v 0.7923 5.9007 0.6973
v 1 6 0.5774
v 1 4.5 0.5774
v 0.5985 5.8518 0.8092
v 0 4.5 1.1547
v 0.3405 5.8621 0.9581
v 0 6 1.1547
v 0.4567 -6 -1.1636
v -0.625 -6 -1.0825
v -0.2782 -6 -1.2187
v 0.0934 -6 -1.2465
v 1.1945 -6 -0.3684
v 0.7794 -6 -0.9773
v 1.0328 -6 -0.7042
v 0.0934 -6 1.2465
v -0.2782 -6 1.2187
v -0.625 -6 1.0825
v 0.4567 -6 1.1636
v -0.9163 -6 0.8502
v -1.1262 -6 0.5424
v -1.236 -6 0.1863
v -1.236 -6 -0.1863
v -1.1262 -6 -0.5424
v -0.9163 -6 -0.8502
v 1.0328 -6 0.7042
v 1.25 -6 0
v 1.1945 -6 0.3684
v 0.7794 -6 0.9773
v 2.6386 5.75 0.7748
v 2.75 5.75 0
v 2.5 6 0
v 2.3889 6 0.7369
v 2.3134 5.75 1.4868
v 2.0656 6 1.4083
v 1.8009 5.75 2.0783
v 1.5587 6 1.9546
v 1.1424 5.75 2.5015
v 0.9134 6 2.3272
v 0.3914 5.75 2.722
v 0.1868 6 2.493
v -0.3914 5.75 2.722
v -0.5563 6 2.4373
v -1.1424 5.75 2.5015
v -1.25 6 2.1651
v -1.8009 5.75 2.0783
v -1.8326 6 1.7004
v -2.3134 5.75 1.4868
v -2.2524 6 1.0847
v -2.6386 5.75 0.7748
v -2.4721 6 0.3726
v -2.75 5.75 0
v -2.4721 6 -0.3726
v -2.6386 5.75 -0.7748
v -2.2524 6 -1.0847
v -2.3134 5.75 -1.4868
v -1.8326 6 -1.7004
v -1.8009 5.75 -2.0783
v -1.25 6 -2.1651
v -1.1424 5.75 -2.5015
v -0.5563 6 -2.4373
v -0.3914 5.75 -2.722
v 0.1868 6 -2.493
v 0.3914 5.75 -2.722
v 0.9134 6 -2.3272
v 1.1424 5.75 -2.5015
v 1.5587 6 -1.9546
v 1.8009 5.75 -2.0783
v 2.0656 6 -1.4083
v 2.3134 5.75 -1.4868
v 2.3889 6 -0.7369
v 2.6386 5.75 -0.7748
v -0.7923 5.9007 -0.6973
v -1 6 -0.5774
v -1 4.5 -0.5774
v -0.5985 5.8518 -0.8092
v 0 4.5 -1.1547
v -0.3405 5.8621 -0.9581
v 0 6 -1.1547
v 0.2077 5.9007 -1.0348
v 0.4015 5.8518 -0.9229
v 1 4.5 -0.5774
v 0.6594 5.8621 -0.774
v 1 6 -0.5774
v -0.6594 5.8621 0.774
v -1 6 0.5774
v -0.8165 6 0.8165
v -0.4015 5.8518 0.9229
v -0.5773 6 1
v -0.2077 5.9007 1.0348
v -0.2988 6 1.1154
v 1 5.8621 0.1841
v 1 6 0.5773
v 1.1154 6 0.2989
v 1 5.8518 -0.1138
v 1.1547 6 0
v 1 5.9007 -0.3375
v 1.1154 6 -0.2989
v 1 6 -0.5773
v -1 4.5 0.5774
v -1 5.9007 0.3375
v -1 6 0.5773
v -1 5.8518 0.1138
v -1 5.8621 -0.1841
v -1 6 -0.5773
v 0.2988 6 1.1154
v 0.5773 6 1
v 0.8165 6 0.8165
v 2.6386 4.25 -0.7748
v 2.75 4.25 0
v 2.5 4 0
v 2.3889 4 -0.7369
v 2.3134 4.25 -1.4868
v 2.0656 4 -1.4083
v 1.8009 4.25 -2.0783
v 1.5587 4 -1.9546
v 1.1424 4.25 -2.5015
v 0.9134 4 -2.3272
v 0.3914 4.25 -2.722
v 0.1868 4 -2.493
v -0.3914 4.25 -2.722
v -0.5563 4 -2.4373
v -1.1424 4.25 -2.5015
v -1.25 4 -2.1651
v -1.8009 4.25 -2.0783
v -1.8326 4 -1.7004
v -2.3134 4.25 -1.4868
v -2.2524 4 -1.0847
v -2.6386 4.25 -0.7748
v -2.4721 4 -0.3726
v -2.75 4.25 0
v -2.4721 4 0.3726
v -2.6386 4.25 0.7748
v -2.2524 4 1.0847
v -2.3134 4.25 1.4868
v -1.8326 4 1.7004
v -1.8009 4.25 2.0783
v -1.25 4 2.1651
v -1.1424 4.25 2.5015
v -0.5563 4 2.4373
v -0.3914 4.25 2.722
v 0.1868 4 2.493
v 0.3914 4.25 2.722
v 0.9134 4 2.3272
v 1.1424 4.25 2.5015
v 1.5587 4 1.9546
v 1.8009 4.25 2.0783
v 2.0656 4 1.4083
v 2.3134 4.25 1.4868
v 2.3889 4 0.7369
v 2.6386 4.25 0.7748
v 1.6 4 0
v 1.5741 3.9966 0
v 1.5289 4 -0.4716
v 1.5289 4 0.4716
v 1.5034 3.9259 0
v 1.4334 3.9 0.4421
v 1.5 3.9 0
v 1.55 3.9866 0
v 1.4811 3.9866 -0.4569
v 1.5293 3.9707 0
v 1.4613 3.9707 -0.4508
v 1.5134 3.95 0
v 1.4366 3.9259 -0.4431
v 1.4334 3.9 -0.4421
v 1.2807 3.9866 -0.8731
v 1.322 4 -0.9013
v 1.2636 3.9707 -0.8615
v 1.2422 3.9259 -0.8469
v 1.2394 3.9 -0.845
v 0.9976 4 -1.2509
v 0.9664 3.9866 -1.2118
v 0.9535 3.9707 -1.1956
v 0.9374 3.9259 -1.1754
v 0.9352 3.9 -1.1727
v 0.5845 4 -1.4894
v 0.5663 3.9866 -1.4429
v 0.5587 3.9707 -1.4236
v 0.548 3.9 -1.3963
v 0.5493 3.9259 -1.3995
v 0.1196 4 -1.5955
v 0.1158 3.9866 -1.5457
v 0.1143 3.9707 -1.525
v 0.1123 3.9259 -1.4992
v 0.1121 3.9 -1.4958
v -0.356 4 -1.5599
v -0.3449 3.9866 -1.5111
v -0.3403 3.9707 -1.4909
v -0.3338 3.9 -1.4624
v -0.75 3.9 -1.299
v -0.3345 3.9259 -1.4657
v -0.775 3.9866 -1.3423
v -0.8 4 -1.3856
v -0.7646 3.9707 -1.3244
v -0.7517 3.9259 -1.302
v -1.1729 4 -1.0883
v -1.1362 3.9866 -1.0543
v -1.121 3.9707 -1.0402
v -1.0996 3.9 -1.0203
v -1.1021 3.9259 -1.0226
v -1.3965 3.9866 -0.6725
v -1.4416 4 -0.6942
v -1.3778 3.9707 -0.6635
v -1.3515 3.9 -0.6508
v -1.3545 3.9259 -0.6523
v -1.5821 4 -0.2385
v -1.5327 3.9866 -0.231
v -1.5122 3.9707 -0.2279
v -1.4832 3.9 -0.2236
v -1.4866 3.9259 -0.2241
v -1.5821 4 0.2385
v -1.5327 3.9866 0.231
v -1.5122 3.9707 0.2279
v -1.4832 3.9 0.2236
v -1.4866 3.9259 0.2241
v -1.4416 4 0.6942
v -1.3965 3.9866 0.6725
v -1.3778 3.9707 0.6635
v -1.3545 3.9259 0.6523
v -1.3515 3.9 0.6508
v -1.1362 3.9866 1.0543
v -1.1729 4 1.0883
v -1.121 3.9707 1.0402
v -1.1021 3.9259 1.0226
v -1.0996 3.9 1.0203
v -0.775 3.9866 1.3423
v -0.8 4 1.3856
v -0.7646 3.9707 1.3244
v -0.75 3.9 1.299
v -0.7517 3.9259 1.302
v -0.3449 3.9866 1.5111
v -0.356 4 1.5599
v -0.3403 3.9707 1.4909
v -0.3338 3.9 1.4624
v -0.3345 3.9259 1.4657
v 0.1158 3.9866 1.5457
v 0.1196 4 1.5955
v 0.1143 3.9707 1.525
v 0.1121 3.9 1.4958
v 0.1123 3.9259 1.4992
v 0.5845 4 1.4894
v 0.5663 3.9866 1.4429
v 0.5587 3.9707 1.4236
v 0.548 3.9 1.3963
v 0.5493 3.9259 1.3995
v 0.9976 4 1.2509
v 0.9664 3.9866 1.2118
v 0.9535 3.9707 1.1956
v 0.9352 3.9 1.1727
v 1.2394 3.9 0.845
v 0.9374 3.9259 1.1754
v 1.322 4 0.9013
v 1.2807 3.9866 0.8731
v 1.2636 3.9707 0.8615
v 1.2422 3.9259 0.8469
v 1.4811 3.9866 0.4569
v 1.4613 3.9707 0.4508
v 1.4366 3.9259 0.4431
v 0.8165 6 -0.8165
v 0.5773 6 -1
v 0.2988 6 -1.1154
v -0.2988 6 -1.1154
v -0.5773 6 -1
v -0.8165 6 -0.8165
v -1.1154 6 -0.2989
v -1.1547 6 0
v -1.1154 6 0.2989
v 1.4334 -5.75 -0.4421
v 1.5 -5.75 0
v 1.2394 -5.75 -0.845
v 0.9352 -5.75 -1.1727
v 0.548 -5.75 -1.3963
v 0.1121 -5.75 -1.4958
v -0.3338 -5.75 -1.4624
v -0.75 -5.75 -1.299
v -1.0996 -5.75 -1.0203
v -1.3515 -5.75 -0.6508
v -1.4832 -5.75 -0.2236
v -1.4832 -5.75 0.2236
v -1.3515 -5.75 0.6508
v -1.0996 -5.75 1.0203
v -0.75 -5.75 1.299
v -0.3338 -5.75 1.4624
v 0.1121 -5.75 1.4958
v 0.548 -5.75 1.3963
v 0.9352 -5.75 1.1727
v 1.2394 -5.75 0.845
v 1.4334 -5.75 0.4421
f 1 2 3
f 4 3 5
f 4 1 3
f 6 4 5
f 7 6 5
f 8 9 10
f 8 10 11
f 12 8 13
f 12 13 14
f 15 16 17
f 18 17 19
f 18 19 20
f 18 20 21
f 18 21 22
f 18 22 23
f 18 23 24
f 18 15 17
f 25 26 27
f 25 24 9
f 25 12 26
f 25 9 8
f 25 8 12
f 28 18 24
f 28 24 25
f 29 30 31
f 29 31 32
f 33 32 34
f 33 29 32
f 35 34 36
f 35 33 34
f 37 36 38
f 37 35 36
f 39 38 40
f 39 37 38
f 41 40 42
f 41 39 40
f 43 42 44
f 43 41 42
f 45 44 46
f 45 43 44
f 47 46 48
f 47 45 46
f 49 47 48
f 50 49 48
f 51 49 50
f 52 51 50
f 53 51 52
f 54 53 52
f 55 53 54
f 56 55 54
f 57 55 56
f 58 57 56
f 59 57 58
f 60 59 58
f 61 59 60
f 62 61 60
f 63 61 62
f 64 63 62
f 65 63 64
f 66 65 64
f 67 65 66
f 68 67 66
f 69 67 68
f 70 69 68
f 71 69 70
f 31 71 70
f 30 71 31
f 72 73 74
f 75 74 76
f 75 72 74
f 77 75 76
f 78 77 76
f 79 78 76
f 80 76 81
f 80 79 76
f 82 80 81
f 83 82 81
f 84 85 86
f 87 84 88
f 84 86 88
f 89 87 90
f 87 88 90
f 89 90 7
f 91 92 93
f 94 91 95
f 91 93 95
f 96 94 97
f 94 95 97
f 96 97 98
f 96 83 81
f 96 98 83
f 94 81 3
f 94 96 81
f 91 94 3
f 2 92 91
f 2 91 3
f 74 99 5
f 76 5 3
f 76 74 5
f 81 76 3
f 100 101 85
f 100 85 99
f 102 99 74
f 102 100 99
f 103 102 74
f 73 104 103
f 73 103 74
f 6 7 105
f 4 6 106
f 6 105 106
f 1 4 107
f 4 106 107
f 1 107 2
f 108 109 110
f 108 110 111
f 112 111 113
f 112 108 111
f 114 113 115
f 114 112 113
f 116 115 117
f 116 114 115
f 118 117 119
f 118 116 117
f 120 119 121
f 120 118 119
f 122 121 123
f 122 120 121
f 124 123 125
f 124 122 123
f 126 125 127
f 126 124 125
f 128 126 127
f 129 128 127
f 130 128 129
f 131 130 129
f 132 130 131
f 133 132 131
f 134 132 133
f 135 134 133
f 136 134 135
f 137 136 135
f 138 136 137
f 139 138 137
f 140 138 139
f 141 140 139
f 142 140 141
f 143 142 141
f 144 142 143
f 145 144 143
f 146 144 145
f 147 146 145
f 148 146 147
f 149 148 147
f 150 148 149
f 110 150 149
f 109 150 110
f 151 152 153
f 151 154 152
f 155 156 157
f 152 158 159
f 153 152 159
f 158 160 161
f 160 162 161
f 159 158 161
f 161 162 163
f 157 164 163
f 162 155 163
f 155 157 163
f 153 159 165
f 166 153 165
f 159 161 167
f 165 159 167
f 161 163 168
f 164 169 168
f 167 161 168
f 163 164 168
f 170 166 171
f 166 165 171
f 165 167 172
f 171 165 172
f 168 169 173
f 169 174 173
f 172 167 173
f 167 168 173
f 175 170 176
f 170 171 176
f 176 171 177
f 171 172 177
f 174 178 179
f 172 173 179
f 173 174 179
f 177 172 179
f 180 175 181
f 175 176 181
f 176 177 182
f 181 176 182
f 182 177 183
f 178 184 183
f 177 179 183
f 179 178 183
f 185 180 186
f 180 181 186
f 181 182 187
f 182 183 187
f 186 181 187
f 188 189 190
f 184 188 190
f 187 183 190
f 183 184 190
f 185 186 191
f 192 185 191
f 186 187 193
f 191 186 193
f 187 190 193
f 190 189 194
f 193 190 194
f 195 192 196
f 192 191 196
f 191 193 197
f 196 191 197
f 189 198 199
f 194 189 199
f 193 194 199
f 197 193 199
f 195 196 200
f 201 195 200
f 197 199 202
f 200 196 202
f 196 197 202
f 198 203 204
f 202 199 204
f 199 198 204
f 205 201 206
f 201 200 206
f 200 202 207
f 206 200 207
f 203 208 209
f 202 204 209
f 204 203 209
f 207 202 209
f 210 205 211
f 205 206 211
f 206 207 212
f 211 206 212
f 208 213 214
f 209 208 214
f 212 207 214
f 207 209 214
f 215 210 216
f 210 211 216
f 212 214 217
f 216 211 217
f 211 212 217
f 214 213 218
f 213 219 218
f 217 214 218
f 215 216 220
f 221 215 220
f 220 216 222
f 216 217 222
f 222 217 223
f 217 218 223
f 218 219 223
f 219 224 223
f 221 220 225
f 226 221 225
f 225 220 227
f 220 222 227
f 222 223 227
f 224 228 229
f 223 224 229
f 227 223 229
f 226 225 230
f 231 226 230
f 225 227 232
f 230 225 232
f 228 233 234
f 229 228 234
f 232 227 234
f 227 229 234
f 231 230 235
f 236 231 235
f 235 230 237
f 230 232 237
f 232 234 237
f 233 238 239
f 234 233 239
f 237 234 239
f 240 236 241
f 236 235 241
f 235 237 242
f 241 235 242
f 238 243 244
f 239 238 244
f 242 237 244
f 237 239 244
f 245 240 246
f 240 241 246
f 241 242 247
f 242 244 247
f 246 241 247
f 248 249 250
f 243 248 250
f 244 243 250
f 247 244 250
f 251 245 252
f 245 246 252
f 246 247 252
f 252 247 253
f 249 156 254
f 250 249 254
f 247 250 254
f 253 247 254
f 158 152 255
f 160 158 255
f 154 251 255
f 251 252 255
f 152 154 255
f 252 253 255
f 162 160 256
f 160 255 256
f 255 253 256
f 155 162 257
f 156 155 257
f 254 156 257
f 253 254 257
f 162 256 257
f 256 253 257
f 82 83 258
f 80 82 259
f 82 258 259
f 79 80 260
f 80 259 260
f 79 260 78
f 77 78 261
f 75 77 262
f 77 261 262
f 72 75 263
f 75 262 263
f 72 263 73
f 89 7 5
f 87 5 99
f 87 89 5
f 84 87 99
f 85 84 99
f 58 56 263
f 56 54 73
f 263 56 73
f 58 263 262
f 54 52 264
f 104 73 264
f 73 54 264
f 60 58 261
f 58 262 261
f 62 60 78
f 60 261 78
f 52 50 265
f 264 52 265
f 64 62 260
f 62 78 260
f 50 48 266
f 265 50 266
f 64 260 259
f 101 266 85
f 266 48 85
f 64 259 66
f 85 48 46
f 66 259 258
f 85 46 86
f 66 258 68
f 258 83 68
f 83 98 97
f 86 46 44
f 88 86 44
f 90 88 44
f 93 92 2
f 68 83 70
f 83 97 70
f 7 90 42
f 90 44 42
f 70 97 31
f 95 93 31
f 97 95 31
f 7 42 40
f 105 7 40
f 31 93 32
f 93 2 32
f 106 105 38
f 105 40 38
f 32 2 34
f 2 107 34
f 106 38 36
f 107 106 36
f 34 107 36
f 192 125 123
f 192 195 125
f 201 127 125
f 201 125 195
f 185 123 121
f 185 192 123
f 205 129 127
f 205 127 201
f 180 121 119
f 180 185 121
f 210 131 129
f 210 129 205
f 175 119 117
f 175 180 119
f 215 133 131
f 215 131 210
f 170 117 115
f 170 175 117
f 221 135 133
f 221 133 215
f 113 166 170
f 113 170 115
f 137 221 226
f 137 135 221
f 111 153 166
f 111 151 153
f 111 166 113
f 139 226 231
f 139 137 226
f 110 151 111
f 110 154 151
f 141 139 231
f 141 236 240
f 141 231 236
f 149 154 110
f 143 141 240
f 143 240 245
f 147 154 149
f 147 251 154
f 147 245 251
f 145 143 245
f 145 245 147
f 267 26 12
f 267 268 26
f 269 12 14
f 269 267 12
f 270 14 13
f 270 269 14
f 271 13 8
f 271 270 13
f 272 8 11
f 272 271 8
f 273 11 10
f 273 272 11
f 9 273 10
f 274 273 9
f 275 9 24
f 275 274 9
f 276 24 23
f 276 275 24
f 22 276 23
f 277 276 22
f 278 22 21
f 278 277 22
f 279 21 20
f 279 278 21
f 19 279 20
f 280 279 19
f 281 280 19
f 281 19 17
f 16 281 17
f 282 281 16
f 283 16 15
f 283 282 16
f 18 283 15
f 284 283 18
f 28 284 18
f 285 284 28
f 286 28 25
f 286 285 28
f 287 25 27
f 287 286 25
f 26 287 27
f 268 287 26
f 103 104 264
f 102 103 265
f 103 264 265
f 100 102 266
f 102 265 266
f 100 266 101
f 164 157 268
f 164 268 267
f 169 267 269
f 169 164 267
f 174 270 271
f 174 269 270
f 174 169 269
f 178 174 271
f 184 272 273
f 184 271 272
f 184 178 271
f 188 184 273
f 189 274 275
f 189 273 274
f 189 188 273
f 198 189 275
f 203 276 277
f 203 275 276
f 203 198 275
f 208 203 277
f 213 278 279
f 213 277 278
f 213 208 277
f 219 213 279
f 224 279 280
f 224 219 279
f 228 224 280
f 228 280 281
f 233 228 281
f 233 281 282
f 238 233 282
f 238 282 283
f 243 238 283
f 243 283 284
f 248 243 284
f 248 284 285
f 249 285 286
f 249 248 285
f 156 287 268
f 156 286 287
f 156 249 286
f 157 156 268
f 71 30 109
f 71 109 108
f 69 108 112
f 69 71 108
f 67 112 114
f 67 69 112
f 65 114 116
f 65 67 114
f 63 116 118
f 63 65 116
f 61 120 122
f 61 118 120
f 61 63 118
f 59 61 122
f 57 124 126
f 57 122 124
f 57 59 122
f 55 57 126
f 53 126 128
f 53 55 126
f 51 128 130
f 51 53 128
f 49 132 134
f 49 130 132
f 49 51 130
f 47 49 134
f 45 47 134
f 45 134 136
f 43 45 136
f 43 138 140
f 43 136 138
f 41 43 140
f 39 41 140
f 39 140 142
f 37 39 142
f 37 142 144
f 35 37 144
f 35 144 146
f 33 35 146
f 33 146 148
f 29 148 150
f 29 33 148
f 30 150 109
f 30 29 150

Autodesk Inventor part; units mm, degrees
ref_plane "YZ Plane" through (0, 0, 0) normal (1, 0, 0) x (0, 1, 0)
ref_plane "XZ Plane" through (0, 0, 0) normal (0, 1, 0) x (-1, 0, 0)
ref_plane "XY Plane" through (0, 0, 0) normal (0, 0, 1) x (1, 0, 0)
sketch "Sketch1" plane through (0, 0, 0) normal (0, 0, 1) x (1, 0, 0)
  line L0 (0, 6) -> (0, -6)
  line L1 (0, -6) -> (1.25, -6)
  line L2 (1.25, -6) -> (1.5, -5.75)
  line L3 (1.5, -5.75) -> (1.5, 3.9)
  line L4 (1.6, 4) -> (2.5, 4)
  line L5 (2.75, 4.25) -> (2.75, 5.75)
  line L6 (2.5, 6) -> (0, 6)
  arc A0 (1.6, 4) -> (1.5, 3.9) centre (1.6, 3.9) ccw
  line L7 (2.5, 6) -> (2.75, 5.75)
  line L8 (2.5, 4) -> (2.75, 4.25)
  point P0 (0, 0)
  point P1 (2.75, 4)
  point P2 (2.75, 6)
  point P3 (0, 0)
  dimension "d0" = 5.5
  dimension "d1" = 2
  dimension "d3" = 3
  dimension "d4" = 3.2
  dimension "d5" = 135
  dimension "d6" = 0.25
  dimension "d7" = 10
  dimension "d9" = 0.25
revolve "Revolution1" add sketch "Sketch1" angle 360 about axis through (0, 6, 0) along (0, -1, 0)
sketch "Sketch2" plane through (0, 6, 0) normal (0, 1, 0) x (1, 0, 0)
  line L0 (0, -1.1547) -> (-1, -0.5774)
  line L1 (-1, -0.5774) -> (-1, 0.5774)
  line L2 (-1, 0.5774) -> (0, 1.1547)
  line L3 (0, 1.1547) -> (1, 0.5774)
  line L4 (1, 0.5774) -> (1, -0.5774)
  line L5 (1, -0.5774) -> (0, -1.1547)
  point P0 (0, 0)
  point P1 (0, 0)
  dimension "d11" = 2
extrude "Extrusion1" cut sketch "Sketch2" against normal blind 1.5
thread "Thread1" size "M3x0.35" class "6g" standard "ANSI Metric M Profile" full length
sketch "Sketch3" plane through (0, 0, 0) normal (1, 0, 0) x (0, 1, 0)
  line L0 (6, 1.1547) -> (5, 0.1547)
  line L1 (5, 0.1547) -> (6, 0.1547)
  line L2 (6, 0.1547) -> (6, 1.1547)
  line L3 (-1.4, 0) -> (8.4, 0) projected
  point P0 (0, 0)
  dimension "d18" = 1
revolve "Revolution2" cut sketch "Sketch3" angle 360 about axis through (0, -10, 0) along (0, 1, 0)
properties part number "Bolt_M3x0.35_10mm_LSH" material "Stainless Steel"
